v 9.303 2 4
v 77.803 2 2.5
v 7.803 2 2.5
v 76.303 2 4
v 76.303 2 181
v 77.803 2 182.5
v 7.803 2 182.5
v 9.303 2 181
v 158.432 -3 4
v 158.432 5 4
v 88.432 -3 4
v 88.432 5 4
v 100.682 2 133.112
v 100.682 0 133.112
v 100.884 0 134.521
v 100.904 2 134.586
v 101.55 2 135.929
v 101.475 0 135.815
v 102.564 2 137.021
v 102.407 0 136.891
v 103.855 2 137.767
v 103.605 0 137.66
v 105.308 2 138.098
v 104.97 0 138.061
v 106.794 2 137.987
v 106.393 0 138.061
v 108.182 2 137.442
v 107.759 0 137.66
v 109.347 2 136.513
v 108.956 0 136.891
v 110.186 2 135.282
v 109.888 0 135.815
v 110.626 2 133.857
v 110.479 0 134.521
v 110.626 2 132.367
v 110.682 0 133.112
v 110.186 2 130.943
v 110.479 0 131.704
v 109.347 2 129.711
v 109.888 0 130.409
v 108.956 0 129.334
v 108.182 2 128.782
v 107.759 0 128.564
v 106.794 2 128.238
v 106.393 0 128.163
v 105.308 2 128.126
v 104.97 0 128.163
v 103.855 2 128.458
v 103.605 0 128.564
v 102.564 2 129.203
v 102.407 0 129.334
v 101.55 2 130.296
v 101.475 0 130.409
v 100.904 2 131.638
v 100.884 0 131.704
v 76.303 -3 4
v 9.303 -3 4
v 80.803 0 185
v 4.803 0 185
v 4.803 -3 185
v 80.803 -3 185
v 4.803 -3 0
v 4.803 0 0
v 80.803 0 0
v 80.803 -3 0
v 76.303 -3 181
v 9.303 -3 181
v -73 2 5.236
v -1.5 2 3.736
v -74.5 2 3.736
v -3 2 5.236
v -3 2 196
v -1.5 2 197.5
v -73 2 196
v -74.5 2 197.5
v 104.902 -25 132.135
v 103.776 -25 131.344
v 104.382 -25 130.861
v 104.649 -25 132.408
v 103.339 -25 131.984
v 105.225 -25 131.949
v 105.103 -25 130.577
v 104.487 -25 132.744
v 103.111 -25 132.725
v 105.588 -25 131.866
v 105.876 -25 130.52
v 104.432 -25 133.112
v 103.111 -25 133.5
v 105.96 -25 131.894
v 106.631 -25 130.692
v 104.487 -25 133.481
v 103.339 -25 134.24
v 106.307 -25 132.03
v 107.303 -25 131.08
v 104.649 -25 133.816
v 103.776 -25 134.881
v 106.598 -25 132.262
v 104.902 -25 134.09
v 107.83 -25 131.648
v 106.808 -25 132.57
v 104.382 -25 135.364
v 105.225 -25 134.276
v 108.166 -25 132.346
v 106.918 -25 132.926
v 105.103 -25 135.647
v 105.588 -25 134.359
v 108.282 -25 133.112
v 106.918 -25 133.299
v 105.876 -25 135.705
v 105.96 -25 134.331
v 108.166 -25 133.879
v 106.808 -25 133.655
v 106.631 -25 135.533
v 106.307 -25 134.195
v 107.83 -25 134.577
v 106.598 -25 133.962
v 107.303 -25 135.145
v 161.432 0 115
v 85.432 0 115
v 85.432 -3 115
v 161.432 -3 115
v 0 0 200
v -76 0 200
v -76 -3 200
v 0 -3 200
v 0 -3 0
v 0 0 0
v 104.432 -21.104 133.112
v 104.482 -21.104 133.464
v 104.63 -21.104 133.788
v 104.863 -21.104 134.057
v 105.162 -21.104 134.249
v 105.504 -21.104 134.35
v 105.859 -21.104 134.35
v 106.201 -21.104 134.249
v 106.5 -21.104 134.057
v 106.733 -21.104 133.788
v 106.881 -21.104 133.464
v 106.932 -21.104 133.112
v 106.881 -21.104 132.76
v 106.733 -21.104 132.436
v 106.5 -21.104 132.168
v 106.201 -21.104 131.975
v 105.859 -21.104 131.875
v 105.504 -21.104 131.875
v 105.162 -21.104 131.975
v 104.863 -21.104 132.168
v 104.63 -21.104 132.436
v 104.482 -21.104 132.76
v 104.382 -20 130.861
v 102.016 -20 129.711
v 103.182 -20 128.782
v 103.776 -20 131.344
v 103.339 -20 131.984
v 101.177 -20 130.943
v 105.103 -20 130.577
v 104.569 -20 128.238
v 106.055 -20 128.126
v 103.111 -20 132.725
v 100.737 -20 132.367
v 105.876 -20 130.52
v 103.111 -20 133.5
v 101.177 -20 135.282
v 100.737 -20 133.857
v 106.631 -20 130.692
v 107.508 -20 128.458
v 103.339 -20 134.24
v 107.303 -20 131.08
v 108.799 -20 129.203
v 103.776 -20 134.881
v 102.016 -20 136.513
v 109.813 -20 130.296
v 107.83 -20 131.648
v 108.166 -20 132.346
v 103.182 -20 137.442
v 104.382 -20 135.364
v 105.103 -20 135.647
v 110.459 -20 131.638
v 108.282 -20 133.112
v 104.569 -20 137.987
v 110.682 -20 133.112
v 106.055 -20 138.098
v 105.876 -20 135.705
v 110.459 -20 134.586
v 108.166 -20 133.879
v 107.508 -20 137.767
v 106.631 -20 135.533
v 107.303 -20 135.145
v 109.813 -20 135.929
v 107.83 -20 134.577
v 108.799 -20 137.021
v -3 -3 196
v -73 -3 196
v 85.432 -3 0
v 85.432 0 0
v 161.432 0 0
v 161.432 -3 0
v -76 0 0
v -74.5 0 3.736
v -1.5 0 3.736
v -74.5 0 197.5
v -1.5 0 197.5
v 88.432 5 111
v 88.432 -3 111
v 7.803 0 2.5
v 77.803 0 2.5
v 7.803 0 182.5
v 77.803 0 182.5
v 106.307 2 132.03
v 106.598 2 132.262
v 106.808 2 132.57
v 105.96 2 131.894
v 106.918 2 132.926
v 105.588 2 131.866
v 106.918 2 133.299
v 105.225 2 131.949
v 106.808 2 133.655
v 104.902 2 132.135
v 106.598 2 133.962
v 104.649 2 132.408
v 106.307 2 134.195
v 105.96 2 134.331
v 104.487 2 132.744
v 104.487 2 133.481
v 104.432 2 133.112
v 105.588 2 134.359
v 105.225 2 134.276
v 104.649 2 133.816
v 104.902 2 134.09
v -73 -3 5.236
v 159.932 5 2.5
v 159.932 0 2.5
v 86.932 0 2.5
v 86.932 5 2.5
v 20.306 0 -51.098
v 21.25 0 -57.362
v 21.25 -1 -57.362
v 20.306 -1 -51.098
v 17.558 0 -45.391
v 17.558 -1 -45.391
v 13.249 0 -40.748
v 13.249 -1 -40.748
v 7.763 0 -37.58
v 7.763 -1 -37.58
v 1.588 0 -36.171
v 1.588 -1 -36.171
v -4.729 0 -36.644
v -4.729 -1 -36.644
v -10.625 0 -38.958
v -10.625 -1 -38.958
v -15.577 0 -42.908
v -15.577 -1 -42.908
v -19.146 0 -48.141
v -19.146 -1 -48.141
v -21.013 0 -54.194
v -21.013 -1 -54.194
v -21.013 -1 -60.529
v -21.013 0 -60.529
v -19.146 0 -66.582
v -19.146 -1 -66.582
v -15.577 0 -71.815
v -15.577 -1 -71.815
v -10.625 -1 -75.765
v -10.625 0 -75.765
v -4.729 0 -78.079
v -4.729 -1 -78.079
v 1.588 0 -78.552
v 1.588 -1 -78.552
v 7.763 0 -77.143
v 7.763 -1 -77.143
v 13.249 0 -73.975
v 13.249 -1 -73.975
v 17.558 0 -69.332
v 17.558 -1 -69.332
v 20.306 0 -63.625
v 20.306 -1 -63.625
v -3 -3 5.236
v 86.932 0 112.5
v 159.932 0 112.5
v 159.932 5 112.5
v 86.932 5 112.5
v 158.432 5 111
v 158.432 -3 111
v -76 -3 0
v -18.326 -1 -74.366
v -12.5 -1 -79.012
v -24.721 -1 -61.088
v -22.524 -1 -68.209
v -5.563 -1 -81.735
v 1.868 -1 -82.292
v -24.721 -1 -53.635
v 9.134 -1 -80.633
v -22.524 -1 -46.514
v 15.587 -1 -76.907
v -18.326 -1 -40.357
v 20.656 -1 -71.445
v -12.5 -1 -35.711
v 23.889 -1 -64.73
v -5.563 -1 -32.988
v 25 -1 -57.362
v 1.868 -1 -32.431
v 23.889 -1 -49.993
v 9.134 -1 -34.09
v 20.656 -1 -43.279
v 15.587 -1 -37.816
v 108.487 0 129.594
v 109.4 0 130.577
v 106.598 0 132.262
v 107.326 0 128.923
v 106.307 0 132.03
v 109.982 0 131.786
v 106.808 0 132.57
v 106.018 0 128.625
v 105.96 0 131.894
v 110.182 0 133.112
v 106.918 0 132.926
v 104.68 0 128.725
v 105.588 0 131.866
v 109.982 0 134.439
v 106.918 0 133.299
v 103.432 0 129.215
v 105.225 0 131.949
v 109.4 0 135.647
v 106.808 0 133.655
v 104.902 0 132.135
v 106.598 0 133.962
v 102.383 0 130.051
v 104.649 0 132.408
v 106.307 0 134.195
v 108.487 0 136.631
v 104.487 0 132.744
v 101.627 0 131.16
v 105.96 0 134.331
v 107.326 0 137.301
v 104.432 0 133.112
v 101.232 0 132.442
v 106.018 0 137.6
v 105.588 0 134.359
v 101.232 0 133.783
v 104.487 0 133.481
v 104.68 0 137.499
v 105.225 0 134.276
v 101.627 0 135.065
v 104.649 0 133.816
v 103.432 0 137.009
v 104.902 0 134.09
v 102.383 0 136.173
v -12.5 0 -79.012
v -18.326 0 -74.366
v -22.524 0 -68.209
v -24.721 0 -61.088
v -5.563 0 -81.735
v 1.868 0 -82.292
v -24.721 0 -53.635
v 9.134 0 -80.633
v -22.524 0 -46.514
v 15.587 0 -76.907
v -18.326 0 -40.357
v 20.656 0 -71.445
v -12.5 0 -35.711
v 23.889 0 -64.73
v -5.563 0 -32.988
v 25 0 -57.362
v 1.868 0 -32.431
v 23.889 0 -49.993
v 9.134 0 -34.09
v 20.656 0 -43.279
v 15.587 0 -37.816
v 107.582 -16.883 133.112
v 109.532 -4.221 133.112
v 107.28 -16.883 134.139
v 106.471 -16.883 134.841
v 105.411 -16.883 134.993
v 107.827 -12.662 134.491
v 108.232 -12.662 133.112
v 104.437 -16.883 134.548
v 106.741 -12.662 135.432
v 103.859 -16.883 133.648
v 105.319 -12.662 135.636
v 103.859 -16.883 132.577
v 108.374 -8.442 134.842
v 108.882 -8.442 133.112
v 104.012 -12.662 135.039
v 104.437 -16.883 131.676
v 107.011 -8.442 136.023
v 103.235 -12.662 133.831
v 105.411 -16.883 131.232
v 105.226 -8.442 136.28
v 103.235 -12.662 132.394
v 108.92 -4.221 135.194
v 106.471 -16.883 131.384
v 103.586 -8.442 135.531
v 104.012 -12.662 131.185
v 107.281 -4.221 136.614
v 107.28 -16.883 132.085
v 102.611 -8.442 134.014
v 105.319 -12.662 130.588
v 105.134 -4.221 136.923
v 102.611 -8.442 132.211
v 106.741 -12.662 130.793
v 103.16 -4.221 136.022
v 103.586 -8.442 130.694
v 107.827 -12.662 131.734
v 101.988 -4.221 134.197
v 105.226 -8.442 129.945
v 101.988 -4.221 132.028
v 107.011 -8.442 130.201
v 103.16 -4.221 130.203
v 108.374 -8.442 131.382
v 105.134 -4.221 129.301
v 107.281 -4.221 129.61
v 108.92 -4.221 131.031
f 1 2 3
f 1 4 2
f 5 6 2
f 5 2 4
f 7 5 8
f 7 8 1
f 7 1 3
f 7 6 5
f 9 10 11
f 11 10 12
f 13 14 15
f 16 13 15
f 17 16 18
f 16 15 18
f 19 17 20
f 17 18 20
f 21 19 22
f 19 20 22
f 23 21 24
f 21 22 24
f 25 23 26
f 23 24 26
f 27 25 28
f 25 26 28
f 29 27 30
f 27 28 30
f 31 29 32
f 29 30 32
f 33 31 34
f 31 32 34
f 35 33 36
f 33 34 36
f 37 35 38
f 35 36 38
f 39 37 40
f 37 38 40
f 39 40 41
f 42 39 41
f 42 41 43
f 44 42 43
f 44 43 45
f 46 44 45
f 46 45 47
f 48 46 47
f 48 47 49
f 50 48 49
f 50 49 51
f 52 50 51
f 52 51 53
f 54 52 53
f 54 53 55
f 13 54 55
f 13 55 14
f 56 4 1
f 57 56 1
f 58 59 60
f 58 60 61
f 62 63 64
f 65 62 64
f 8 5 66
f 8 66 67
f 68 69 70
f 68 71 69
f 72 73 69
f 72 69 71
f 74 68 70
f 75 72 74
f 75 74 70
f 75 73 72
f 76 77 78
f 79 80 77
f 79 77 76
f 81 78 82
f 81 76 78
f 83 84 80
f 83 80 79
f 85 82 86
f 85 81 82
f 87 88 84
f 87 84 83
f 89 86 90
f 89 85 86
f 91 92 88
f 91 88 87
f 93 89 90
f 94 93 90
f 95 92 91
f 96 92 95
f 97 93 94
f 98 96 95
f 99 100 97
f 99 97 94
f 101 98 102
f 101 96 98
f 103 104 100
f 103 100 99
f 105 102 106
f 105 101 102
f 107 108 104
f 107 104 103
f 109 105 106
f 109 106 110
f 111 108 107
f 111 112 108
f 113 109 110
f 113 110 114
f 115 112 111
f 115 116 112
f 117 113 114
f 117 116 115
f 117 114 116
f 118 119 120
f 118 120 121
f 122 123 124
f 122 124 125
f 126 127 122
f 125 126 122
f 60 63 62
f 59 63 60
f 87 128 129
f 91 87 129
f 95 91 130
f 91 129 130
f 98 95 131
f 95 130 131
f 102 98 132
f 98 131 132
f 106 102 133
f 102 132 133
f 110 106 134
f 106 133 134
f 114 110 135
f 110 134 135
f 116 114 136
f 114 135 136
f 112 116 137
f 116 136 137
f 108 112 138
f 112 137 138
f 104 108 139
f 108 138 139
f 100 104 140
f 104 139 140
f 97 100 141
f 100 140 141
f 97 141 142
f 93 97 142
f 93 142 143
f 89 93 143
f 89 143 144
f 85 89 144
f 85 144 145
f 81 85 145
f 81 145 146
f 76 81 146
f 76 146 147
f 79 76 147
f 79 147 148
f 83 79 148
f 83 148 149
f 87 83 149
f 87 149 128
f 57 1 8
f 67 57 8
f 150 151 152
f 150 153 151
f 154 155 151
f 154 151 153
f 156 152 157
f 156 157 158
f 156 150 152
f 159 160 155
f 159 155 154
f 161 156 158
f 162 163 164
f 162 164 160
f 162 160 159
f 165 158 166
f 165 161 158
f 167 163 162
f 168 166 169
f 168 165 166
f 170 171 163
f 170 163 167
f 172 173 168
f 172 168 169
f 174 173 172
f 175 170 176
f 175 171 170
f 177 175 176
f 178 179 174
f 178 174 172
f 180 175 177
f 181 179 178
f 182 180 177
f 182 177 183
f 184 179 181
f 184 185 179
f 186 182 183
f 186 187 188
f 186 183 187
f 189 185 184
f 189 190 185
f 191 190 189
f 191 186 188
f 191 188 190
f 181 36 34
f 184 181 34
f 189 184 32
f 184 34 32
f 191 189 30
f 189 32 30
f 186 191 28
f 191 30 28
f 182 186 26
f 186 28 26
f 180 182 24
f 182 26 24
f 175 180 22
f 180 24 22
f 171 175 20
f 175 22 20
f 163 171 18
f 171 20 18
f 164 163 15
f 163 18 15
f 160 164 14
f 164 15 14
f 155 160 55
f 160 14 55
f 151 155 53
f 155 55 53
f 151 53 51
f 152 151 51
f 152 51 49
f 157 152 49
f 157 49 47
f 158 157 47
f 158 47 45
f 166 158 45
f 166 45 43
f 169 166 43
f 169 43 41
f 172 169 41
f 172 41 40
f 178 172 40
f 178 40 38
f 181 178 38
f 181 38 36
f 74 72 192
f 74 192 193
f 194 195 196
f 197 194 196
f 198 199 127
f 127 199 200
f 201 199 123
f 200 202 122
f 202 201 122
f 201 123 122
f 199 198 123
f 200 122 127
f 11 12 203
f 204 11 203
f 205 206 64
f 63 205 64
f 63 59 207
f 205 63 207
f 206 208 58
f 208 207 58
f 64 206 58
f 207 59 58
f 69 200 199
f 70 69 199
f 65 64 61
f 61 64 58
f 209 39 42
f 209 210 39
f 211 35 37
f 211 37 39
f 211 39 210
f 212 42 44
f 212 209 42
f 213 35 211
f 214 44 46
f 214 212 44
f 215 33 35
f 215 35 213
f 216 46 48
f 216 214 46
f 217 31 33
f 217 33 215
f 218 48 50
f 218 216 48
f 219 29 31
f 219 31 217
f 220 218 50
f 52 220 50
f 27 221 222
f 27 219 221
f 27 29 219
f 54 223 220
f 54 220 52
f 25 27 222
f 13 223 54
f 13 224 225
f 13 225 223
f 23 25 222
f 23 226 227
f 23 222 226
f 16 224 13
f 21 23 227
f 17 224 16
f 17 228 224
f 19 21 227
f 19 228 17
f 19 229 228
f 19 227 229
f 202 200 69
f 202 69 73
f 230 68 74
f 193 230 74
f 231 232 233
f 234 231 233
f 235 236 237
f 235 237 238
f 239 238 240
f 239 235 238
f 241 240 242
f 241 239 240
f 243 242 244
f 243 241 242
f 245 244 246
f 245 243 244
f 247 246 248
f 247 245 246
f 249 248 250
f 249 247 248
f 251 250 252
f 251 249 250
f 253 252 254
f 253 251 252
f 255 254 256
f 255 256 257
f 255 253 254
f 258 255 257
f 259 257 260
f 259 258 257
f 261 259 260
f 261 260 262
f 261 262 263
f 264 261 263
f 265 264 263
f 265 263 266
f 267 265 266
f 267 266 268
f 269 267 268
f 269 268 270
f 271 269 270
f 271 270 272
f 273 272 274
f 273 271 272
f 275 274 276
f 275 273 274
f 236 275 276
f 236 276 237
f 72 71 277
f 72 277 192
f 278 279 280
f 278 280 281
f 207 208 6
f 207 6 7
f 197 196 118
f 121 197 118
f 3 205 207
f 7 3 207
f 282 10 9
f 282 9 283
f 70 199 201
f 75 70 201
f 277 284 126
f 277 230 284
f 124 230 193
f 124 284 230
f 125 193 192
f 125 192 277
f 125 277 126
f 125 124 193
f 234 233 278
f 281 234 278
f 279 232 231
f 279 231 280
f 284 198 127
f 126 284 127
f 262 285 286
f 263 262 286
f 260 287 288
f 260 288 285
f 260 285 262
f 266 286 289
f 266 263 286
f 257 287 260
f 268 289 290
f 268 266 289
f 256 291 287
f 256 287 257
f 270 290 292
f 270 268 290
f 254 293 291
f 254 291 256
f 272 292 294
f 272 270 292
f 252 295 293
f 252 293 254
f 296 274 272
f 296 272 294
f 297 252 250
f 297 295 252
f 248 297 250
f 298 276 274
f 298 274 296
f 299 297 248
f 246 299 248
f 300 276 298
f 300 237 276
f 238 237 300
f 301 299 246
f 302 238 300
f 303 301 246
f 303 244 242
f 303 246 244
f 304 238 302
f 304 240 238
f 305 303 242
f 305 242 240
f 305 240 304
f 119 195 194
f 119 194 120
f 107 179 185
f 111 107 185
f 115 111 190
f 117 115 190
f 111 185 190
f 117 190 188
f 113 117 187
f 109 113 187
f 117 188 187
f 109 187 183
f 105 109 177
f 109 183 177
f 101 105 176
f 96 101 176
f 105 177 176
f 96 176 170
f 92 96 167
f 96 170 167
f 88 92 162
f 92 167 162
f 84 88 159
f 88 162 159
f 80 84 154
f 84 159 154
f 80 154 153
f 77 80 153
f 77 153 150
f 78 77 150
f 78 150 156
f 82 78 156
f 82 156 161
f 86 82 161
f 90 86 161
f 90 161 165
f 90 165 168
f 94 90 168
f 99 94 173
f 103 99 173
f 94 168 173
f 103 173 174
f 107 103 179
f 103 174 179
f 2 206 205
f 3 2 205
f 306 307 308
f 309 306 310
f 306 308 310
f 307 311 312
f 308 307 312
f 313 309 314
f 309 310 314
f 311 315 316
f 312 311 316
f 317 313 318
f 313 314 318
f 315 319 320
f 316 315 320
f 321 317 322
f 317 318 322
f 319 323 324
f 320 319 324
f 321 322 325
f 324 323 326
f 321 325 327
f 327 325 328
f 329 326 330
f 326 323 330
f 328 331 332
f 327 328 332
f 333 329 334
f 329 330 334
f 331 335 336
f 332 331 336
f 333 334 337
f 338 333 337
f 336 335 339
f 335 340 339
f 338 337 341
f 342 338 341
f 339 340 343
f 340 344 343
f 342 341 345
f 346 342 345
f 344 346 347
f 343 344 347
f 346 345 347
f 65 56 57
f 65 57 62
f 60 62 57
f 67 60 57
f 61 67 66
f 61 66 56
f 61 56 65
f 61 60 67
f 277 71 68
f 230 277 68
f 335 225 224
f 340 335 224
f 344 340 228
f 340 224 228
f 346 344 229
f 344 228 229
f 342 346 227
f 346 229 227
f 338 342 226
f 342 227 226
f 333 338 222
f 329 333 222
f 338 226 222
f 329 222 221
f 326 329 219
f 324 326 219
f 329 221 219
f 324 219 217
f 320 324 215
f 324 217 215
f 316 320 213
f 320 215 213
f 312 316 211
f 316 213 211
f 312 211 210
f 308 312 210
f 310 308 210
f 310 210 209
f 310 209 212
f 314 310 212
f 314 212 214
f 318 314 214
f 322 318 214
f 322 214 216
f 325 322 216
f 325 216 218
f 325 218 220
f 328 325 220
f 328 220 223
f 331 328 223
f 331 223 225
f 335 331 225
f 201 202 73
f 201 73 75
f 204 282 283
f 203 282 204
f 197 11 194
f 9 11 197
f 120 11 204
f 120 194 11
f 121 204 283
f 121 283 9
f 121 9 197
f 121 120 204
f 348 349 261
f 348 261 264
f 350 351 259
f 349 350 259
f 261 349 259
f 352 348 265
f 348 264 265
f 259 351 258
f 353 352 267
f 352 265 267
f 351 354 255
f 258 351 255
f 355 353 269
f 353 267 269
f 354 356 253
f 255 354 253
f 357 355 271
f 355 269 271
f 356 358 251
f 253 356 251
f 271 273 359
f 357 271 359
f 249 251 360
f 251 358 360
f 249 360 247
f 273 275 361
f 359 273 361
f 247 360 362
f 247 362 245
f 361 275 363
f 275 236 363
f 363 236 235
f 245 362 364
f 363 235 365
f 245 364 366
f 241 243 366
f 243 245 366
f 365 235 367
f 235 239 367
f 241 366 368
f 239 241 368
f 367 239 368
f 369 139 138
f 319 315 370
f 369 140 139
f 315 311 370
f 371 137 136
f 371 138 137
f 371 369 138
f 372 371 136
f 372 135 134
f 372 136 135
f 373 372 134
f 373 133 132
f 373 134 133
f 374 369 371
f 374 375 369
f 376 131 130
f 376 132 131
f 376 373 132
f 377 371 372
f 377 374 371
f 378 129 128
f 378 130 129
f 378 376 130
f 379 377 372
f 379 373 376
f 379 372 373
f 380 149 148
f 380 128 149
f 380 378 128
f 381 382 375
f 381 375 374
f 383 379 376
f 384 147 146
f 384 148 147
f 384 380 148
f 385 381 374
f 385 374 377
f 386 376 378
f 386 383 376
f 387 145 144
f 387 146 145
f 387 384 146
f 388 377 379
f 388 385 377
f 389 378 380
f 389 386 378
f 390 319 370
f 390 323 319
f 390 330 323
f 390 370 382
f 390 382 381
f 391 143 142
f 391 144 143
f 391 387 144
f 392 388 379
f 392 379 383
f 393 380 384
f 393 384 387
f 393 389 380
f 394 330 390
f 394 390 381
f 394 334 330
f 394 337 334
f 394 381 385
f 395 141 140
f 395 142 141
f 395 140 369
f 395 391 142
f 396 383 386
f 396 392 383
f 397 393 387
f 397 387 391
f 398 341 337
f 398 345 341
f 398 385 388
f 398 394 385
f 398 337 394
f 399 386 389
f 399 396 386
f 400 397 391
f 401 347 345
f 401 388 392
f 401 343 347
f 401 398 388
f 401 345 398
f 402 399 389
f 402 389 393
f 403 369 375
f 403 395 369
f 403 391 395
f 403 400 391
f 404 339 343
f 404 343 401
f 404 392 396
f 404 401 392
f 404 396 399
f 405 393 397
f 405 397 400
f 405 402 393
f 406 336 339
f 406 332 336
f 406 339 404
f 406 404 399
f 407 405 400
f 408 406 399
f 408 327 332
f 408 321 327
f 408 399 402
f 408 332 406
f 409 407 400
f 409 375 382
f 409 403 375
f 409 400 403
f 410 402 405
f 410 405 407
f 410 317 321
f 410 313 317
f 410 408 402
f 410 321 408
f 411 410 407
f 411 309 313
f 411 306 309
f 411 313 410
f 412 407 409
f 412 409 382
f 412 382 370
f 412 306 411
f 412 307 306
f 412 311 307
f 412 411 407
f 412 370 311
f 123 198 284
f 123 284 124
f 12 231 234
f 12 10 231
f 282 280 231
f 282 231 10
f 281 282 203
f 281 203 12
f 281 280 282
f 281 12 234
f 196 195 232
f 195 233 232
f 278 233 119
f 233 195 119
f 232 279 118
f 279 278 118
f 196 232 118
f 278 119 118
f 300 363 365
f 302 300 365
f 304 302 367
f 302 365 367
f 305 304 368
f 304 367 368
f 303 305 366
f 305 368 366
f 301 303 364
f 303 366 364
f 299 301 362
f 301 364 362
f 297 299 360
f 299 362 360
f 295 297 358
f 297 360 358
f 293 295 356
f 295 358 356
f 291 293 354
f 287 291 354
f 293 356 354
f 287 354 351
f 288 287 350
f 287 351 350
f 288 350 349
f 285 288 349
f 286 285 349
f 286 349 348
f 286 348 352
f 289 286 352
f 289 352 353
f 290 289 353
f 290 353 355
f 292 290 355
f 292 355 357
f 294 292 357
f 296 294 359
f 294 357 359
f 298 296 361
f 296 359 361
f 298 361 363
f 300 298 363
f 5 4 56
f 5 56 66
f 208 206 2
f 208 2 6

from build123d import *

# Parameters (mm, degrees)
F0_W      = 76
F0_H      = 200
F1_DEPTH  = 3
F2_W      = 73
F2_H      = 193.764015
F3_DEPTH  = 2
F4_W      = 70
F4_H      = 190.764015
F5_DEPTH  = 25.4
F6_W      = 76
F6_H      = 185
F7_DEPTH  = 3
F8_W      = 70
F8_H      = 180
F9_DEPTH  = 2
F10_W     = 67
F10_H     = 177
F11_DEPTH = 25.4
F12_W     = 76
F12_H     = 115
F13_DEPTH = 3
F14_W     = 73
F14_H     = 110
F15_DEPTH = 5
F16_W     = 70
F16_H     = 107
F17_DEPTH = 25.4
F18_R     = 5
F19_DEPTH = 20
F20_R     = 2.6
F21_DEPTH = 5
F23_R     = 0.65
F22_R     = 4.5
F25_R     = 5
F26_DEPTH = 2
F27_R     = 1.25
F28_DEPTH = 31
F29_R     = 25
F29_R_2   = 21.25
F30_DEPTH = 1


with BuildPart() as f1:
    # F0 (on Front) → F1 (new body)
    with BuildSketch(Plane.XZ):
        with Locations((-38, 100)):
            Rectangle(F0_W, F0_H)
    extrude(amount=F1_DEPTH)

    # F2 (on face) → F3 (join)
    with BuildSketch(Plane(origin=(0, 0, 0), x_dir=(-1, 0, 0), z_dir=(0, 1, 0))):
        with Locations((38, 100.617992)):
            Rectangle(F2_W, F2_H)
    extrude(amount=F3_DEPTH)

    # F4 (on face) → F5 (cut)
    with BuildSketch(Plane(origin=(0, 2, 0), x_dir=(-1, 0, 0), z_dir=(0, 1, 0))):
        with Locations((38, 100.617992)):
            Rectangle(F4_W, F4_H)
    extrude(amount=-F5_DEPTH, mode=Mode.SUBTRACT)


with BuildPart() as f7:
    # F6 (on Front) → F7 (new body)
    with BuildSketch(Plane.XZ):
        with Locations((42.803314, 92.5)):
            Rectangle(F6_W, F6_H)
    extrude(amount=F7_DEPTH)

    # F8 (on face) → F9 (join)
    with BuildSketch(Plane(origin=(0, 0, 0), x_dir=(-1, 0, 0), z_dir=(0, 1, 0))):
        with Locations((-42.803314, 92.5)):
            Rectangle(F8_W, F8_H)
    extrude(amount=F9_DEPTH)

    # F10 (on face) → F11 (cut)
    with BuildSketch(Plane(origin=(0, 2, 0), x_dir=(-1, 0, 0), z_dir=(0, 1, 0))):
        with Locations((-42.803314, 92.5)):
            Rectangle(F10_W, F10_H)
    extrude(amount=-F11_DEPTH, mode=Mode.SUBTRACT)


with BuildPart() as f13:
    # F12 (on Front) → F13 (new body)
    with BuildSketch(Plane.XZ):
        with Locations((123.432, 57.5)):
            Rectangle(F12_W, F12_H)
    extrude(amount=F13_DEPTH)

    # F14 (on face) → F15 (join)
    with BuildSketch(Plane(origin=(0, 0, 0), x_dir=(-1, 0, 0), z_dir=(0, 1, 0))):
        with Locations((-123.432, 57.5)):
            Rectangle(F14_W, F14_H)
    extrude(amount=F15_DEPTH)

    # F16 (on face) → F17 (cut)
    with BuildSketch(Plane(origin=(0, 5, 0), x_dir=(-1, 0, 0), z_dir=(0, 1, 0))):
        with Locations((-123.432, 57.5)):
            Rectangle(F16_W, F16_H)
    extrude(amount=-F17_DEPTH, mode=Mode.SUBTRACT)


with BuildPart() as f19:
    # F18 (on Front) → F19 (new body)
    with BuildSketch(Plane.XZ):
        with Locations((105.681598, 133.112267)):
            Circle(F18_R)
    extrude(amount=F19_DEPTH)

    # F20 (on face) → F21 (join)
    with BuildSketch(Plane.XZ.offset(20)):
        with Locations((105.681598, 133.112267)):
            Circle(F20_R)
    extrude(amount=F21_DEPTH)

    # F23 (on face) → F24 section 0
    with BuildSketch(Plane.XZ.offset(25)):
        with Locations((105.681598, 133.112267)):
            Circle(F23_R)
    # F22 (on face) → F24 section 1
    with BuildSketch(Plane(origin=(0, 0, 0), x_dir=(-1, 0, 0), z_dir=(0, 1, 0))):
        with Locations((-105.681598, 133.112267)):
            Circle(F22_R)
    loft(mode=Mode.SUBTRACT)

    # F25 (on face) → F26 (join)
    with BuildSketch(Plane(origin=(0, 0, 0), x_dir=(-1, 0, 0), z_dir=(0, 1, 0))):
        with Locations((-105.681598, 133.112267)):
            Circle(F25_R)
    extrude(amount=F26_DEPTH)

    # F27 (on face) → F28 (cut)
    with BuildSketch(Plane(origin=(0, 2, 0), x_dir=(-1, 0, 0), z_dir=(0, 1, 0))):
        with Locations((-105.681598, 133.112267)):
            Circle(F27_R)
    extrude(amount=-F28_DEPTH, mode=Mode.SUBTRACT)


with BuildPart() as f30:
    # F29 (on Front) → F30 (new body)
    with BuildSketch(Plane.XZ):
        with Locations((0, -57.361517)):
            Circle(F29_R)
        with Locations((0, -57.361517)):
            Circle(F29_R_2, mode=Mode.SUBTRACT)
    extrude(amount=F30_DEPTH)


solid = Compound([f1.part, f7.part, f13.part, f19.part, f30.part])
